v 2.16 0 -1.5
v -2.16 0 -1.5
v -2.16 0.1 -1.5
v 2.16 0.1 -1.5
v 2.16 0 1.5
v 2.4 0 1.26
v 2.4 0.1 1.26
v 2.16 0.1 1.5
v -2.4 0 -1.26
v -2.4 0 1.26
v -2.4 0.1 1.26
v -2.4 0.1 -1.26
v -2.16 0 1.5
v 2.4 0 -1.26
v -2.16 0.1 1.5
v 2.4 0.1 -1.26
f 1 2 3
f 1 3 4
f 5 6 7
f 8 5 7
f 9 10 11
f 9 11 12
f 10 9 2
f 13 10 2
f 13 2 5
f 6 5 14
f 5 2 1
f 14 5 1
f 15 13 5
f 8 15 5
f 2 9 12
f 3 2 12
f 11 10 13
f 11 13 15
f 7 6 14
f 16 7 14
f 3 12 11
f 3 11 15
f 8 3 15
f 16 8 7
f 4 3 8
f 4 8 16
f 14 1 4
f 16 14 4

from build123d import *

# Parameters (mm, degrees)
ESBO_O1_W       = 4.8
ESBO_O1_H       = 3
EXTRUS_O1_DEPTH = 0.1
CHANFRO1_SIZE   = 0.24
CHANFRO2_SIZE   = 0.24
CHANFRO3_SIZE   = 0.24
CHANFRO4_SIZE   = 0.24


with BuildPart() as part:
    # Esboço1 → Extrusão1 (new body)
    with BuildSketch(Plane(origin=(0, 0, 0), x_dir=(1, 0, 0), z_dir=(0, 1, 0))):
        Rectangle(ESBO_O1_W, ESBO_O1_H)
    extrude(amount=EXTRUS_O1_DEPTH)

    # Chanfro1
    chanfro1_edges = [part.edges().sort_by_distance(p)[0] for p in [
        (2.4, 0.05, 1.5),
    ]]
    chamfer(chanfro1_edges, length=CHANFRO1_SIZE)

    # Chanfro2
    chanfro2_edges = [part.edges().sort_by_distance(p)[0] for p in [
        (-2.4, 0.05, 1.5),
    ]]
    chamfer(chanfro2_edges, length=CHANFRO2_SIZE)

    # Chanfro3
    chanfro3_edges = [part.edges().sort_by_distance(p)[0] for p in [
        (2.4, 0.05, -1.5),
    ]]
    chamfer(chanfro3_edges, length=CHANFRO3_SIZE)

    # Chanfro4
    chanfro4_edges = [part.edges().sort_by_distance(p)[0] for p in [
        (-2.4, 0.05, -1.5),
    ]]
    chamfer(chanfro4_edges, length=CHANFRO4_SIZE)


solid = part.part
